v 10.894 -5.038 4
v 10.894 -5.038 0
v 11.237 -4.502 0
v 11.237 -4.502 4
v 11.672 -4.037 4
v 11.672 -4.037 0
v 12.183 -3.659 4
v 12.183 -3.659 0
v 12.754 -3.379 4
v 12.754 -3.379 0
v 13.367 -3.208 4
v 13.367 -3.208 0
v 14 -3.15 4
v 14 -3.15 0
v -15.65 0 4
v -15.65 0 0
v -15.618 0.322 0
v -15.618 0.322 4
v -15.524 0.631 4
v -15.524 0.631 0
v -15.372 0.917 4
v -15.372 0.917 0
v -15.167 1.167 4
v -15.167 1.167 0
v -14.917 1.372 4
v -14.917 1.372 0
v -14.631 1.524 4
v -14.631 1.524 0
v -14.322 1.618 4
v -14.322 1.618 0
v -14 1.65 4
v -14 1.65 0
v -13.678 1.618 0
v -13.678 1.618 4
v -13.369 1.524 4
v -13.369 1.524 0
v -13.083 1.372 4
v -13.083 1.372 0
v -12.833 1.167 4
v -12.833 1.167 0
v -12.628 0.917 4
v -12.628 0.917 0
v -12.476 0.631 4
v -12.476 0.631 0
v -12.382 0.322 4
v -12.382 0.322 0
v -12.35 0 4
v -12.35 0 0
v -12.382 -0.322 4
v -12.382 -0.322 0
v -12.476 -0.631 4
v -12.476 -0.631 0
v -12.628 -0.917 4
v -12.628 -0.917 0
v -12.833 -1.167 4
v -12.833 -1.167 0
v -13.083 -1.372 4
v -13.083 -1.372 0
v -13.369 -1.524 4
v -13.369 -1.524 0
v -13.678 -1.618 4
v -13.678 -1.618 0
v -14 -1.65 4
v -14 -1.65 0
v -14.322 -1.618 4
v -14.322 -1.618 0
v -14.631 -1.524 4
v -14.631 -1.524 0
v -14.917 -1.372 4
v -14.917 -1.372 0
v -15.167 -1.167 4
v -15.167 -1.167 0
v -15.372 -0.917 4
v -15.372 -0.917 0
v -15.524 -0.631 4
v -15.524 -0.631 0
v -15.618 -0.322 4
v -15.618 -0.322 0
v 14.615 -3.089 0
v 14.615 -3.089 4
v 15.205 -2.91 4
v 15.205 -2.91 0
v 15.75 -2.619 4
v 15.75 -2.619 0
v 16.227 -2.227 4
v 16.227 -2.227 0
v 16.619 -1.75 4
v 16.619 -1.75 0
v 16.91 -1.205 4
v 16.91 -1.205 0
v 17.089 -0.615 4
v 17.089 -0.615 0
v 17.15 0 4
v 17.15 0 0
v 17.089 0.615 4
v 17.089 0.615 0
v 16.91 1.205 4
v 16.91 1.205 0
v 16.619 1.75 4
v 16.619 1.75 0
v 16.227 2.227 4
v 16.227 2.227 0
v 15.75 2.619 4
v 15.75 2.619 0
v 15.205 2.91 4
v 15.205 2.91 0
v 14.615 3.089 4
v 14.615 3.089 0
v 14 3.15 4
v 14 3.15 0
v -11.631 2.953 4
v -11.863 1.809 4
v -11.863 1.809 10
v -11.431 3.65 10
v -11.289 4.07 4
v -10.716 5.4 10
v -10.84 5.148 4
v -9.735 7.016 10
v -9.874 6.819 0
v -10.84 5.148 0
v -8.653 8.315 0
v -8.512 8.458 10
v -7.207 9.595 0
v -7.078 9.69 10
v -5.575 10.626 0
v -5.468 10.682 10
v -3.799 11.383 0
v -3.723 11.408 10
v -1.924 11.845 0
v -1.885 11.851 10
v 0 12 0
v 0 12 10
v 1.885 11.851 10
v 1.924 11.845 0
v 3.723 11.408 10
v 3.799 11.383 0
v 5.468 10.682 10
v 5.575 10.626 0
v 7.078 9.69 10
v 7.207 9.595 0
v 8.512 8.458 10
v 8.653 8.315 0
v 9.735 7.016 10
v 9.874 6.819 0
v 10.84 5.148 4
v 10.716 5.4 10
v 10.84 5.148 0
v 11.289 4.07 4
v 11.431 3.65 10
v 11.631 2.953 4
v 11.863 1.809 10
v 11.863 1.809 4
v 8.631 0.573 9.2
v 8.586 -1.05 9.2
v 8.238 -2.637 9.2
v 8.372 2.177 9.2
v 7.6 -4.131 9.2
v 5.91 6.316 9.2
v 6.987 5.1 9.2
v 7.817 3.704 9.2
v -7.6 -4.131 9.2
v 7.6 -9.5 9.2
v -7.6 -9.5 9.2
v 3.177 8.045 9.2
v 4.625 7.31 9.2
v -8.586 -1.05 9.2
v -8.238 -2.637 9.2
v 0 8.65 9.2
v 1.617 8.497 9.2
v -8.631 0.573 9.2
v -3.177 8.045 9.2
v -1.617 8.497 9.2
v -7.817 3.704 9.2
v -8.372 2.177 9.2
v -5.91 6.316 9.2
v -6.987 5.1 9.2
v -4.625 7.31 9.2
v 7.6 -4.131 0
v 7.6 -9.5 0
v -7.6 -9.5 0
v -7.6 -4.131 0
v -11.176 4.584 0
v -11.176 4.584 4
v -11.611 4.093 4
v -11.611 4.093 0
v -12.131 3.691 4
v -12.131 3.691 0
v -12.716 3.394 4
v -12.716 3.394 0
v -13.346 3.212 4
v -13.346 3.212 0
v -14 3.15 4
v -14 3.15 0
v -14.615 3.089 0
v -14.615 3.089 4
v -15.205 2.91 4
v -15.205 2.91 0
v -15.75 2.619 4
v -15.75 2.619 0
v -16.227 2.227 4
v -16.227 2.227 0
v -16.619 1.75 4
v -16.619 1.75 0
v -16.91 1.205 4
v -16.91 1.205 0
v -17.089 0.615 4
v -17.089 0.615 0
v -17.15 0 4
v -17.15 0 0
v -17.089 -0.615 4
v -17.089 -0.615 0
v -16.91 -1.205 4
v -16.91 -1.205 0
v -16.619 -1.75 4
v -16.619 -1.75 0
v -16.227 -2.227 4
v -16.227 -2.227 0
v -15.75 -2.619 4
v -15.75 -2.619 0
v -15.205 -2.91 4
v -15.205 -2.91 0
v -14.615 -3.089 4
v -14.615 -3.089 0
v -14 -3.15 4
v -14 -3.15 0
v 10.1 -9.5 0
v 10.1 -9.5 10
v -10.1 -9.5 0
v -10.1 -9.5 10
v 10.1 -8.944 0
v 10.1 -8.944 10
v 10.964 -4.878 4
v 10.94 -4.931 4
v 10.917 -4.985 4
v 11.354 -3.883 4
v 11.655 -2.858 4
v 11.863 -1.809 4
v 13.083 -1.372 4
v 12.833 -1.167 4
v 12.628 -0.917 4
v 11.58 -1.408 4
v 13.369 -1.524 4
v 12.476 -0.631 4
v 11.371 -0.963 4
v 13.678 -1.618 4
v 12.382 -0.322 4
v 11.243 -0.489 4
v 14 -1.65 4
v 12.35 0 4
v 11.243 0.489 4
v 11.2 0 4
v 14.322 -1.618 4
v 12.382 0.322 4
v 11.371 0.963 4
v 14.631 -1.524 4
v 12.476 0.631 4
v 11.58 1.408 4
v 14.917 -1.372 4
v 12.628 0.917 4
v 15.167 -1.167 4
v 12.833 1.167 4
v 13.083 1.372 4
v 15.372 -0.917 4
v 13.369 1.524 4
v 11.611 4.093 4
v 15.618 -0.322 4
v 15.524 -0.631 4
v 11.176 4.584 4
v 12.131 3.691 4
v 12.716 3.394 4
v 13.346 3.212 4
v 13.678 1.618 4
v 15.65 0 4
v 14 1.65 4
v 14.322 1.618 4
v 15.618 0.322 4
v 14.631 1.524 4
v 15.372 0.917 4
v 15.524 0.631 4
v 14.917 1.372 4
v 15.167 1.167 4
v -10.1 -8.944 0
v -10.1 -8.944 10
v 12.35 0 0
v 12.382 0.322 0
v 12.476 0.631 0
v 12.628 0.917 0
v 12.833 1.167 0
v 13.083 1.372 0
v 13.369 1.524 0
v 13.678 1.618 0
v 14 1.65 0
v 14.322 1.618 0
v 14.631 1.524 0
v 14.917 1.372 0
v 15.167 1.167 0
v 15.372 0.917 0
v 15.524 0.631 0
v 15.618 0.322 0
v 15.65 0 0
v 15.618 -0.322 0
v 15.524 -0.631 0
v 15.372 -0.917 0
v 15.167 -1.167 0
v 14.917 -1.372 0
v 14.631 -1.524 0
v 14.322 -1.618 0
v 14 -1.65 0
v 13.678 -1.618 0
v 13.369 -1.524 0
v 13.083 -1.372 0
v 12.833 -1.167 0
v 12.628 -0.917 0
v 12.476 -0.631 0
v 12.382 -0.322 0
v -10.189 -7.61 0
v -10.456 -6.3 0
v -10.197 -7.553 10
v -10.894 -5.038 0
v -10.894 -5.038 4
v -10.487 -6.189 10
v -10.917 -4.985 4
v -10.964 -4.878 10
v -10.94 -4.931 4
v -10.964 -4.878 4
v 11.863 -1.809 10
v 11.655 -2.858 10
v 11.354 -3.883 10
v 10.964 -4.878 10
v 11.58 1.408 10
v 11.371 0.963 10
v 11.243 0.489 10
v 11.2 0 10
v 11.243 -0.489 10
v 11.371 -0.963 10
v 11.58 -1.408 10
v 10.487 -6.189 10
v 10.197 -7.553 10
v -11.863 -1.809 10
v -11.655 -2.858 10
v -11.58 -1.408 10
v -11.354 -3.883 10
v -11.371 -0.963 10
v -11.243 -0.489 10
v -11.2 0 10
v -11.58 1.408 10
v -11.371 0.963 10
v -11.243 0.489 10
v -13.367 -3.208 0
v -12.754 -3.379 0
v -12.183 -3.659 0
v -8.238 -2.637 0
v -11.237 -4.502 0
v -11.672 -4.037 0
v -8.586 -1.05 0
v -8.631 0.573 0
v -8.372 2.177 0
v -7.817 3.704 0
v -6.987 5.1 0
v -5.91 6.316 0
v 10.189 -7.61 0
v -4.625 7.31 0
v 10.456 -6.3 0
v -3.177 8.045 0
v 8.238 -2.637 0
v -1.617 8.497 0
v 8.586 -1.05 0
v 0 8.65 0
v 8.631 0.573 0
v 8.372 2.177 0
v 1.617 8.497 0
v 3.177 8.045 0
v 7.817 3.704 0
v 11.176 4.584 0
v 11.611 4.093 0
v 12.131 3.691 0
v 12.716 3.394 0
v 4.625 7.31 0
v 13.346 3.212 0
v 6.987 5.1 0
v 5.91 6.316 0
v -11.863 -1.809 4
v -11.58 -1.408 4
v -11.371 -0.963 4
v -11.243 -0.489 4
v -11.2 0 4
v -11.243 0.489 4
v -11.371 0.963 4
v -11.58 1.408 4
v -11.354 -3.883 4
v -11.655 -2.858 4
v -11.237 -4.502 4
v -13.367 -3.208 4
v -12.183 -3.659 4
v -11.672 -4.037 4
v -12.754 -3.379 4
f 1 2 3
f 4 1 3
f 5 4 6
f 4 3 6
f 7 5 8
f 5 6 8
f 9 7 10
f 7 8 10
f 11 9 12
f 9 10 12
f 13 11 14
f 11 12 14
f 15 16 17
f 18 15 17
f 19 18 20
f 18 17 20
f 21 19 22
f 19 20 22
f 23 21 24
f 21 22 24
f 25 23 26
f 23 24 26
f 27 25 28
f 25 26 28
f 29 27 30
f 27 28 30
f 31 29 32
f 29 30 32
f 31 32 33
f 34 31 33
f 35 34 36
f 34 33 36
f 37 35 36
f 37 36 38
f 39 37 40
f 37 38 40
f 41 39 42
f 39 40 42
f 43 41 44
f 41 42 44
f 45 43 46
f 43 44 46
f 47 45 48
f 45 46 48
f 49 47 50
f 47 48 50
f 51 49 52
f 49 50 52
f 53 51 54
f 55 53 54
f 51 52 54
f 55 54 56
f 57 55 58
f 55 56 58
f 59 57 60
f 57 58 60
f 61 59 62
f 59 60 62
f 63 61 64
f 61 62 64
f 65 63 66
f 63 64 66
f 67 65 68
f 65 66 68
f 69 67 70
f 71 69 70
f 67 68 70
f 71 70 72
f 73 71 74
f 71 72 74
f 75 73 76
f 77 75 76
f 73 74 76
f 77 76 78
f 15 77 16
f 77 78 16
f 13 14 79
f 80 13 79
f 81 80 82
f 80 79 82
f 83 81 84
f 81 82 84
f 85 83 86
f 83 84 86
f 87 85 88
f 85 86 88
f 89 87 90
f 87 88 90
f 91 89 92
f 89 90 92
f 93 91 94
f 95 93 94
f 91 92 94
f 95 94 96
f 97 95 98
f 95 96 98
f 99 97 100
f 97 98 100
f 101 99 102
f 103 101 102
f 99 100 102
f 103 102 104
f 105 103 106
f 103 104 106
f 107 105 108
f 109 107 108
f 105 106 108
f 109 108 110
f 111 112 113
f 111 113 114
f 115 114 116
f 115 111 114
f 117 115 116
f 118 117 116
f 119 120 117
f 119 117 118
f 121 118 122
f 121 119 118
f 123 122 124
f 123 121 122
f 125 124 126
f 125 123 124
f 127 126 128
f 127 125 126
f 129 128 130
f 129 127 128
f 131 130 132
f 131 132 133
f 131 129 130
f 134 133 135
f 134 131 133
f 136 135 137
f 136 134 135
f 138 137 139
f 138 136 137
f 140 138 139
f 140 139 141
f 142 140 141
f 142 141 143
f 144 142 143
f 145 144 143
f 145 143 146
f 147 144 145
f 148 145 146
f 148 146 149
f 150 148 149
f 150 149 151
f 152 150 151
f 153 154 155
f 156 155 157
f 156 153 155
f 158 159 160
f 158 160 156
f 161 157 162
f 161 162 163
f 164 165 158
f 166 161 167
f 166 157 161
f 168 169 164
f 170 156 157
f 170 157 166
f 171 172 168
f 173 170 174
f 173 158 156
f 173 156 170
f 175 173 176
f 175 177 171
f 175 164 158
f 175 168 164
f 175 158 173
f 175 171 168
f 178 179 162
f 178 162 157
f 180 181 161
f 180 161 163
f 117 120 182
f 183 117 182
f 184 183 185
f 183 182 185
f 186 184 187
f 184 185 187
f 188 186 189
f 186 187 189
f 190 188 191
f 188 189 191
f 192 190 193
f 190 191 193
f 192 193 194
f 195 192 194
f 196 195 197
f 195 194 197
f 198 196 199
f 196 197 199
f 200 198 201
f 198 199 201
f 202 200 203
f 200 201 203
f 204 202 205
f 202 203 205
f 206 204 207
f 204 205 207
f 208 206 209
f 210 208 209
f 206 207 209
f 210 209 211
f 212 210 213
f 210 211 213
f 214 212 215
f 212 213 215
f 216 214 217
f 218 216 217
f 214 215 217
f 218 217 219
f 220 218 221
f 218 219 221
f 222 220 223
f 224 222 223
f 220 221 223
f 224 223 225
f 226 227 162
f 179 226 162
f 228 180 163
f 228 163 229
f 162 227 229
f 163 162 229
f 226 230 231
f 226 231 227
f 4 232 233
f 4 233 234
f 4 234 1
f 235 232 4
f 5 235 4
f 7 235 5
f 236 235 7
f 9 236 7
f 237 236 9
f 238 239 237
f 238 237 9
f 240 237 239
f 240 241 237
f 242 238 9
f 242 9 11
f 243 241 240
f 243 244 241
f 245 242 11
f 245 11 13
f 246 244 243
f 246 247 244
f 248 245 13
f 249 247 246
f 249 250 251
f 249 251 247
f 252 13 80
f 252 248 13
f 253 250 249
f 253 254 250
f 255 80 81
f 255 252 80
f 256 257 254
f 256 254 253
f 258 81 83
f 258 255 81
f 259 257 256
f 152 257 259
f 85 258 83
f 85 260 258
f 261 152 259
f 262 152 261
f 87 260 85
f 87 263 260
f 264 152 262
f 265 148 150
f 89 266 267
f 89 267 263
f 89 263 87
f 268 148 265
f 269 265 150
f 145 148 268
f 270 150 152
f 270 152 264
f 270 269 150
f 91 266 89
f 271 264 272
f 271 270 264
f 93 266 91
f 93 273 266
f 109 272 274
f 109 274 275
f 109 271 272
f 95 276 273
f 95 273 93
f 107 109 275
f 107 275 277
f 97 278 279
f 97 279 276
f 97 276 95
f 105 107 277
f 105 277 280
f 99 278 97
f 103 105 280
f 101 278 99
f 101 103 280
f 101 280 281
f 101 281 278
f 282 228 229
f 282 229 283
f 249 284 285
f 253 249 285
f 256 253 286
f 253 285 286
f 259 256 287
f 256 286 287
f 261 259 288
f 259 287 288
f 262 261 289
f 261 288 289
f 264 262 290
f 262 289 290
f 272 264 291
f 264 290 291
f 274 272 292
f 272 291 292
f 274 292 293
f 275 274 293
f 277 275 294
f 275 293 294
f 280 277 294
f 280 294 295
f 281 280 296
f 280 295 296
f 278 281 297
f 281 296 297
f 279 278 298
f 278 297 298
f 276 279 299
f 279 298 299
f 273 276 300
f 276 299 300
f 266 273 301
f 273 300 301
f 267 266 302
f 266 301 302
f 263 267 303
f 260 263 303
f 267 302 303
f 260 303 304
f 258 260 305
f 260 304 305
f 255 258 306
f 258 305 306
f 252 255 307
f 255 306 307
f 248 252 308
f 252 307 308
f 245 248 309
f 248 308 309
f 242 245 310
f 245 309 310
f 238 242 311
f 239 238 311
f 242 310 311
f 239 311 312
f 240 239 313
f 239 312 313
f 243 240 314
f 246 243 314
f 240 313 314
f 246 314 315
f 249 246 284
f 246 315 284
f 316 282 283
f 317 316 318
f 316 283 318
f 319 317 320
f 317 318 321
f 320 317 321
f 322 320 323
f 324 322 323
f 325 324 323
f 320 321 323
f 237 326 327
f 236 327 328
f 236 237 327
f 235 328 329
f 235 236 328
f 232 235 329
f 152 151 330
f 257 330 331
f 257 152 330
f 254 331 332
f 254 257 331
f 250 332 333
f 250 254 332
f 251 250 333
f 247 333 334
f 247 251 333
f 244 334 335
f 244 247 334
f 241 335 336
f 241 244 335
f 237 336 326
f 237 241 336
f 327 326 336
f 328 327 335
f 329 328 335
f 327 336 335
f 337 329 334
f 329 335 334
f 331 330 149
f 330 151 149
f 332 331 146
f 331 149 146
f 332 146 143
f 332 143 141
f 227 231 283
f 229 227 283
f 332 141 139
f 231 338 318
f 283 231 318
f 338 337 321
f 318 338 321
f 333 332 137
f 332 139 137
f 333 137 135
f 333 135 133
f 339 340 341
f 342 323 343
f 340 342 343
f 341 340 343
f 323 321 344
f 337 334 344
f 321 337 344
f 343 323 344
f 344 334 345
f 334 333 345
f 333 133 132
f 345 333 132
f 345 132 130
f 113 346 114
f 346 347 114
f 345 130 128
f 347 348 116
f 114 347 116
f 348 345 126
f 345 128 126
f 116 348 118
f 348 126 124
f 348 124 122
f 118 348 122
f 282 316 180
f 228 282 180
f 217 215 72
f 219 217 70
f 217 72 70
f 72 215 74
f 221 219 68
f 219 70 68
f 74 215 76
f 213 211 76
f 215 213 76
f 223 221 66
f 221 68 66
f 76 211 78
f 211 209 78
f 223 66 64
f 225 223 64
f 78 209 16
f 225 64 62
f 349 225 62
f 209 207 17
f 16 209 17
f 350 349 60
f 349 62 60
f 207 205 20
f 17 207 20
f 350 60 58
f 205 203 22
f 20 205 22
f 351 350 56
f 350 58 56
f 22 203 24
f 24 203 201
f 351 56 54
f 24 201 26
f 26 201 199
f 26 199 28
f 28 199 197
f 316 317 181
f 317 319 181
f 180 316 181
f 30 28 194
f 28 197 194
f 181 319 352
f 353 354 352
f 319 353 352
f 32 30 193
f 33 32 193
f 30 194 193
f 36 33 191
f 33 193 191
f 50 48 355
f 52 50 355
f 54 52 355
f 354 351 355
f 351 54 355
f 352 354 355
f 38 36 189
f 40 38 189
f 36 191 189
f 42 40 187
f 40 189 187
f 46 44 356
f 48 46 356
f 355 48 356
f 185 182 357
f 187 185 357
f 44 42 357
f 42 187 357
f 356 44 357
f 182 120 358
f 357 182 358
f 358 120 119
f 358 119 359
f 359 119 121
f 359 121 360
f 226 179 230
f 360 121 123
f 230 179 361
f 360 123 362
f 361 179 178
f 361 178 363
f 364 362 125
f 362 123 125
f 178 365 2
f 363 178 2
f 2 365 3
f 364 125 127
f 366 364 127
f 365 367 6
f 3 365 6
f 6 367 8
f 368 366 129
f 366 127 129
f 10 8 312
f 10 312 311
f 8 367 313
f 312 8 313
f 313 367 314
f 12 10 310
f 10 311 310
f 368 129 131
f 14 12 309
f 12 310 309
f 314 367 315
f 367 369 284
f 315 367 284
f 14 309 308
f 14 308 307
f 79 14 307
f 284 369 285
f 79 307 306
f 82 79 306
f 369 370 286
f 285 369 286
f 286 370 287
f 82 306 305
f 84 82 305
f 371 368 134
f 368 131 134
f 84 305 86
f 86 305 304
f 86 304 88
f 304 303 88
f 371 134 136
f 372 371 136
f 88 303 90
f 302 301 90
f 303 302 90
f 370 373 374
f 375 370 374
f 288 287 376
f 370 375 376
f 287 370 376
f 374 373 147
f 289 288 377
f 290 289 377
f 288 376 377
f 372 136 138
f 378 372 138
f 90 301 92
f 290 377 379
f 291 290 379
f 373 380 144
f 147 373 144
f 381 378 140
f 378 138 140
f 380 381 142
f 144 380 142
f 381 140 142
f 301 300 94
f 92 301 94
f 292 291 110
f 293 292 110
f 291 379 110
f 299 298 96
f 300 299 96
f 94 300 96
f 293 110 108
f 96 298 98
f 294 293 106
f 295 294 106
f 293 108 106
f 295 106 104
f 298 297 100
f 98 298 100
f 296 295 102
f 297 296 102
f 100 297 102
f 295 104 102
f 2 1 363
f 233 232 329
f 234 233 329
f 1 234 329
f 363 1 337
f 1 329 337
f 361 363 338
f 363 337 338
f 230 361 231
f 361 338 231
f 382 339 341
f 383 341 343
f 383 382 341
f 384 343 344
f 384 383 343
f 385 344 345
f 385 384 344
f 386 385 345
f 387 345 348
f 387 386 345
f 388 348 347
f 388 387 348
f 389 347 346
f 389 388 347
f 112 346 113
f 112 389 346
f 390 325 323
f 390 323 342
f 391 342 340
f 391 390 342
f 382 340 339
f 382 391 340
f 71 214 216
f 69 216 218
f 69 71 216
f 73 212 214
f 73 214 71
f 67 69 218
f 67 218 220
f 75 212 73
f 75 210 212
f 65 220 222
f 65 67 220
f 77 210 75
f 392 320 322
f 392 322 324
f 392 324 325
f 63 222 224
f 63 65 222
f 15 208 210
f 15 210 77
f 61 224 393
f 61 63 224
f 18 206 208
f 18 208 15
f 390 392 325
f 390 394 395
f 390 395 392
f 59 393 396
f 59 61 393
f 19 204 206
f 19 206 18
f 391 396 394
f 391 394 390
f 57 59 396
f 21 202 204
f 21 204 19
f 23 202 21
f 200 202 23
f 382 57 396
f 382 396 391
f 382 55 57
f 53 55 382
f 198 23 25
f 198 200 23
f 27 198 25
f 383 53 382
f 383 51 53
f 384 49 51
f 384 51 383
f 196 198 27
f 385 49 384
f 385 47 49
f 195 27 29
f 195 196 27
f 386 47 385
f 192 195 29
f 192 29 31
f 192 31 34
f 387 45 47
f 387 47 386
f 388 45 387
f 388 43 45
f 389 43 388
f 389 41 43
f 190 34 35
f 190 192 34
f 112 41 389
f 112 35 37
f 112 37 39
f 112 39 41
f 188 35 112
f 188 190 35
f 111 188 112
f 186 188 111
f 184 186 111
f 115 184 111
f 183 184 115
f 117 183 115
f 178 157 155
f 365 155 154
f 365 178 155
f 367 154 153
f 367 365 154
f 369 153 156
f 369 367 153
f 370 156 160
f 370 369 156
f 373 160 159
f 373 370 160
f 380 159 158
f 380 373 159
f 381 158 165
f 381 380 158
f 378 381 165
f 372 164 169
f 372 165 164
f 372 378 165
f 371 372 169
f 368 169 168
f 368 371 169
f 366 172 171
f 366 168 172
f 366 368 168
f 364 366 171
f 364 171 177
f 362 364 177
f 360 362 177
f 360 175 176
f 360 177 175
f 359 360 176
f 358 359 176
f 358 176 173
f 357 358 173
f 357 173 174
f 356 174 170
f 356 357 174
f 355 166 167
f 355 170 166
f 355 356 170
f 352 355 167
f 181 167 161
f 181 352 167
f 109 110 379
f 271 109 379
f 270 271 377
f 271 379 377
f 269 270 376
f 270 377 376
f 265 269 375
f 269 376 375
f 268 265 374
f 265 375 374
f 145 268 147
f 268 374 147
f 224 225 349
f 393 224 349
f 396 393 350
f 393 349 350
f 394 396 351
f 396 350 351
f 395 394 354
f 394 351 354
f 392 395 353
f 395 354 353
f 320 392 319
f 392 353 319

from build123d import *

# Parameters (mm, degrees)
BOSS_EXTRUDE1_DEPTH = 10
BOSS_EXTRUDE2_DEPTH = 0.8
FILLET1_R           = 10
SKETCH3_R           = 1.65
BOSS_EXTRUDE4_DEPTH = 4
SKETCH4_R           = 2.8
CUT_EXTRUDE1_DEPTH  = 7


with BuildPart() as part:
    # Sketch1 → Boss-Extrude1 (new body)
    with BuildSketch(Plane.XY):
        with BuildLine():
            Line((-7.6, -4.13067791), (-7.6, -9.5))
            Line((-7.6, -9.5), (-10.1, -9.5))
            Line((-10.1, -9.5), (-10.1, -6.479969136))
            ThreePointArc((-10.1, -6.479969136), (0, 12), (10.1, -6.479969136))
            Line((10.1, -6.479969136), (10.1, -9.5))
            Line((10.1, -9.5), (7.6, -9.5))
            Line((7.6, -9.5), (7.6, -4.13067791))
            ThreePointArc((7.6, -4.13067791), (0, 8.65), (-7.6, -4.13067791))
        make_face()
    extrude(amount=BOSS_EXTRUDE1_DEPTH)

    # Sketch2 → Boss-Extrude2 (add)
    with BuildSketch(Plane.XY.offset(10)):
        with BuildLine():
            Line((7.6, -4.13067791), (7.6, -9.5))
            Line((7.6, -9.5), (-7.6, -9.5))
            Line((-7.6, -9.5), (-7.6, -4.13067791))
            ThreePointArc((-7.6, -4.13067791), (0, 8.65), (7.6, -4.13067791))
        make_face()
    extrude(amount=-BOSS_EXTRUDE2_DEPTH)

    # Fillet1
    fillet1_edges = [part.edges().sort_by_distance(p)[0] for p in [
        (10.1, -6.479969136, 5),
        (-10.1, -6.479969136, 5),
    ]]
    fillet(fillet1_edges, radius=FILLET1_R)

    # Sketch3 → Boss-Extrude4 (add)
    with BuildSketch(Plane(origin=(0, 0, 0), x_dir=(-1, 0, 0), z_dir=(0, 0, -1))):
        with BuildLine():
            ThreePointArc((14, 3.15), (17.15, 0), (14, -3.15))
            ThreePointArc((14, -3.15), (12.130662272, -3.6913019), (10.839796225, -5.147700243))
            ThreePointArc((10.839796225, -5.147700243), (12, 0), (10.839796225, 5.147700243))
            ThreePointArc((10.839796225, 5.147700243), (12.130662272, 3.6913019), (14, 3.15))
        make_face()
        with Locations((14, 0)):
            Circle(SKETCH3_R, mode=Mode.SUBTRACT)
        with BuildLine():
            ThreePointArc((-10.839796225, 5.147700243), (-12, 0), (-10.839796225, -5.147700243))
            ThreePointArc((-10.839796225, -5.147700243), (-12.130662272, -3.6913019), (-14, -3.15))
            ThreePointArc((-14, -3.15), (-17.15, 0), (-14, 3.15))
            ThreePointArc((-14, 3.15), (-12.130662272, 3.6913019), (-10.839796225, 5.147700243))
        make_face()
        with Locations((-14, 0)):
            Circle(SKETCH3_R, mode=Mode.SUBTRACT)
    extrude(amount=-BOSS_EXTRUDE4_DEPTH)

    # Sketch4 → Cut-Extrude1 (cut, through all)
    with BuildSketch(Plane.XY.offset(4)):
        with Locations((-14, 0)):
            Circle(SKETCH4_R)
        with Locations((14, 0)):
            Circle(SKETCH4_R)
    extrude(amount=CUT_EXTRUDE1_DEPTH, mode=Mode.SUBTRACT)


solid = part.part
